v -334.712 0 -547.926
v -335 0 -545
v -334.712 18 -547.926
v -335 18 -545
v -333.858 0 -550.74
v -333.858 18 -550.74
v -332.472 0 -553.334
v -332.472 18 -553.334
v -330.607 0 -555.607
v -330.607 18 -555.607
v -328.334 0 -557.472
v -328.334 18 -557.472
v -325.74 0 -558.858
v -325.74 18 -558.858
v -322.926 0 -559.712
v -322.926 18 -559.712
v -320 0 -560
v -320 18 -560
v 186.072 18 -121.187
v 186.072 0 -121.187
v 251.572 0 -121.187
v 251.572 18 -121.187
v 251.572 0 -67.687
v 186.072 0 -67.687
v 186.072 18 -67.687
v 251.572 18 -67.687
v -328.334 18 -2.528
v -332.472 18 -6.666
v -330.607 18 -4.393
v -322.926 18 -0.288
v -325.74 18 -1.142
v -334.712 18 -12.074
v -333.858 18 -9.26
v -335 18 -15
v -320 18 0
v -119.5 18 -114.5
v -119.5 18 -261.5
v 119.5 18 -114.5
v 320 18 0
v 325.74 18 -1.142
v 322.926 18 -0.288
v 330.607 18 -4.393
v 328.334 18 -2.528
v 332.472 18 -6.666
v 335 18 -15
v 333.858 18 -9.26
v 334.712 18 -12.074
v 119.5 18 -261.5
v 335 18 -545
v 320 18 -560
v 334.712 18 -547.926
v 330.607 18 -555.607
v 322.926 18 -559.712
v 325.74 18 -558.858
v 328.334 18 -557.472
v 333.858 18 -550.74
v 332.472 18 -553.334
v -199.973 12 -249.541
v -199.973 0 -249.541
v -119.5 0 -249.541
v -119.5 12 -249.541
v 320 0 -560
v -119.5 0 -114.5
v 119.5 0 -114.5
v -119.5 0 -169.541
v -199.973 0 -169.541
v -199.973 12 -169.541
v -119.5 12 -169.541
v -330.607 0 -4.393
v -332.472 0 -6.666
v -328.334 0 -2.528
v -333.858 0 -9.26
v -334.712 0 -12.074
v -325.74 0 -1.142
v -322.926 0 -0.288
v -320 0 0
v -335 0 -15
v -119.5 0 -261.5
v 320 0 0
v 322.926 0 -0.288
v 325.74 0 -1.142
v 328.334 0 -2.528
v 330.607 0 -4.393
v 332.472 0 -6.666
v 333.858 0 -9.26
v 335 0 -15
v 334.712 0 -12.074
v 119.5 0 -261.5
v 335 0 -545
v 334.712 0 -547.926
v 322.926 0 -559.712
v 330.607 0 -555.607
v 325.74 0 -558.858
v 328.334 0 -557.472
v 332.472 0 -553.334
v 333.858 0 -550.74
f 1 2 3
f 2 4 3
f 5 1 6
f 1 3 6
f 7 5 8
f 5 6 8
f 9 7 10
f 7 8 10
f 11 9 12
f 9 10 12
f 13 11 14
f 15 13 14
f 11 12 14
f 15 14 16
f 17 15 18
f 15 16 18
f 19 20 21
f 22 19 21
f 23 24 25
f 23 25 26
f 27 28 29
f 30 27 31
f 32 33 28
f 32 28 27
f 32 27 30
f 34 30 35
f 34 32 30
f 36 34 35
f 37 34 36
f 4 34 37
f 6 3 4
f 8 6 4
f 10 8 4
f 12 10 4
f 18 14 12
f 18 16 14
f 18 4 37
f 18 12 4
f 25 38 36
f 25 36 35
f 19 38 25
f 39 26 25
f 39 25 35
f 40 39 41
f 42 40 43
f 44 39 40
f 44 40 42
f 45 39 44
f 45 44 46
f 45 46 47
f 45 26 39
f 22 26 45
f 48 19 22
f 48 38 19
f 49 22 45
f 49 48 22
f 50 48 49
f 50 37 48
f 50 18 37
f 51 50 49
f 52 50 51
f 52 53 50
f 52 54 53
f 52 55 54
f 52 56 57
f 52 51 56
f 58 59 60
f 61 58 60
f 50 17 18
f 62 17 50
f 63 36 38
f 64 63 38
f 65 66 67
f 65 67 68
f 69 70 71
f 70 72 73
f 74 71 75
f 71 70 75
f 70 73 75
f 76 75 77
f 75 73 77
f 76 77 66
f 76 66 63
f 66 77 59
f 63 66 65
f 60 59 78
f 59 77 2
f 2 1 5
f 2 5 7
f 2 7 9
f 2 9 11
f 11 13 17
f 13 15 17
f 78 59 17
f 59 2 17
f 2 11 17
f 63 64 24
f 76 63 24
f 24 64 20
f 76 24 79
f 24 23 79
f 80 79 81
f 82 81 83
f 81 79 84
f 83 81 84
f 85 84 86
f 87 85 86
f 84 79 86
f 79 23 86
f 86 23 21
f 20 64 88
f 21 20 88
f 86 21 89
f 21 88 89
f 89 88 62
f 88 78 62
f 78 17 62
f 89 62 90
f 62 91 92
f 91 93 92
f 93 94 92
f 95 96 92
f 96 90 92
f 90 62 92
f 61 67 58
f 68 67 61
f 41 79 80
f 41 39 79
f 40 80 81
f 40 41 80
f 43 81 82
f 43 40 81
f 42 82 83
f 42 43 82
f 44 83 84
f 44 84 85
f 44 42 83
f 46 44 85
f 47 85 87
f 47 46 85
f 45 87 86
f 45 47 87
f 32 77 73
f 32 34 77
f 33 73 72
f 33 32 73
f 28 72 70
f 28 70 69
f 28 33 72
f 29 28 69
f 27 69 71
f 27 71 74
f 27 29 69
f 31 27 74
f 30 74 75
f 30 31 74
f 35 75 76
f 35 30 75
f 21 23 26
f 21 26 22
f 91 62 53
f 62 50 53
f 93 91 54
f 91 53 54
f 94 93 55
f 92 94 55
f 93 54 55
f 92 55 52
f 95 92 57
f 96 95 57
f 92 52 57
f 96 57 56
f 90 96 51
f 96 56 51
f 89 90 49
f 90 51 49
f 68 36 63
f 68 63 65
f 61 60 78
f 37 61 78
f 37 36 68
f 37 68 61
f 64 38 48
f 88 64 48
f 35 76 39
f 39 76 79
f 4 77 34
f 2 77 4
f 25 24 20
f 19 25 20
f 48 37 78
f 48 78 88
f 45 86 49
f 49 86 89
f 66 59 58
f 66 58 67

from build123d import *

# Parameters (mm, degrees)
SKETCH_1_W               = 670
SKETCH_1_H               = 560
EXTRUDE_1_DEPTH          = 18
CUT_EXTRUDE_1_DEPTH      = 653.80088848
CUT_EXTRUDE_1_DEPTH_BACK = 653.80088848
SKETCH_2_W               = 65.5
SKETCH_2_H               = 53.5
CUT_EXTRUDE_2_DEPTH      = 653.80088848
CUT_EXTRUDE_2_DEPTH_BACK = 653.80088848
SKETCH_3_W               = 228
SKETCH_3_H               = 136
CUT_EXTRUDE_3_REACH      = 654.801
SKETCH_4_W               = 239
SKETCH_4_H               = 147
FILLET_1_R               = 15
SKETCH_8_W               = 80.472707968
SKETCH_8_H               = 80
CUT_EXTRUDE_4_DEPTH      = 12


with BuildPart() as part:
    # 草图1 → 凸台-拉伸1 (new body)
    with BuildSketch(Plane(origin=(0, 0, 0), x_dir=(1, 0, 0), z_dir=(0, 1, 0))):
        with Locations((0, 280)):
            Rectangle(SKETCH_1_W, SKETCH_1_H)
    extrude(amount=EXTRUDE_1_DEPTH)

    # 草图2 → 切除-拉伸1 (cut, two sides: drawn at the far end of the back side and taken through both)
    with BuildSketch(Plane(origin=(0, 18, 0), x_dir=(1, 0, 0), z_dir=(0, 1, 0)).offset(-CUT_EXTRUDE_1_DEPTH_BACK)):
        with Locations((218.822373939, 94.436899918)):
            Rectangle(SKETCH_2_W, SKETCH_2_H)
    extrude(amount=CUT_EXTRUDE_1_DEPTH + CUT_EXTRUDE_1_DEPTH_BACK, mode=Mode.SUBTRACT)

    # 草图3 → 切除-拉伸2 (cut, two sides: drawn at the far end of the back side and taken through both)
    with BuildSketch(Plane(origin=(0, 18, 0), x_dir=(1, 0, 0), z_dir=(0, 1, 0)).offset(-CUT_EXTRUDE_2_DEPTH_BACK)):
        with Locations((0, 188)):
            Rectangle(SKETCH_3_W, SKETCH_3_H)
    extrude(amount=CUT_EXTRUDE_2_DEPTH + CUT_EXTRUDE_2_DEPTH_BACK, mode=Mode.SUBTRACT)

    # 草图4 → 切除-拉伸3 (cut, up to next)
    with BuildSketch(Plane(origin=(0, 18, 0), x_dir=(1, 0, 0), z_dir=(0, 1, 0)), mode=Mode.PRIVATE) as cut_extrude_3_sk1:
        with Locations((0, 188)):
            Rectangle(SKETCH_4_W, SKETCH_4_H)
    cut_extrude_3_tool1 = extrude(cut_extrude_3_sk1.sketch, amount=-CUT_EXTRUDE_3_REACH, mode=Mode.PRIVATE) & part.part
    add(cut_extrude_3_tool1.solids().sort_by_distance((0, 18, -188))[0], mode=Mode.SUBTRACT)

    # 圆角1
    fillet_1_edges = [part.edges().sort_by_distance(p)[0] for p in [
        (-335, 9, -560),
        (335, 9, -560),
        (335, 9, 0),
        (-335, 9, 0),
    ]]
    fillet(fillet_1_edges, radius=FILLET_1_R)

    # 草图8 → 切除-拉伸4 (cut)
    with BuildSketch(Plane.XZ):
        with Locations((-159.736353984, -209.541384695)):
            Rectangle(SKETCH_8_W, SKETCH_8_H)
    extrude(amount=-CUT_EXTRUDE_4_DEPTH, mode=Mode.SUBTRACT)


solid = part.part
